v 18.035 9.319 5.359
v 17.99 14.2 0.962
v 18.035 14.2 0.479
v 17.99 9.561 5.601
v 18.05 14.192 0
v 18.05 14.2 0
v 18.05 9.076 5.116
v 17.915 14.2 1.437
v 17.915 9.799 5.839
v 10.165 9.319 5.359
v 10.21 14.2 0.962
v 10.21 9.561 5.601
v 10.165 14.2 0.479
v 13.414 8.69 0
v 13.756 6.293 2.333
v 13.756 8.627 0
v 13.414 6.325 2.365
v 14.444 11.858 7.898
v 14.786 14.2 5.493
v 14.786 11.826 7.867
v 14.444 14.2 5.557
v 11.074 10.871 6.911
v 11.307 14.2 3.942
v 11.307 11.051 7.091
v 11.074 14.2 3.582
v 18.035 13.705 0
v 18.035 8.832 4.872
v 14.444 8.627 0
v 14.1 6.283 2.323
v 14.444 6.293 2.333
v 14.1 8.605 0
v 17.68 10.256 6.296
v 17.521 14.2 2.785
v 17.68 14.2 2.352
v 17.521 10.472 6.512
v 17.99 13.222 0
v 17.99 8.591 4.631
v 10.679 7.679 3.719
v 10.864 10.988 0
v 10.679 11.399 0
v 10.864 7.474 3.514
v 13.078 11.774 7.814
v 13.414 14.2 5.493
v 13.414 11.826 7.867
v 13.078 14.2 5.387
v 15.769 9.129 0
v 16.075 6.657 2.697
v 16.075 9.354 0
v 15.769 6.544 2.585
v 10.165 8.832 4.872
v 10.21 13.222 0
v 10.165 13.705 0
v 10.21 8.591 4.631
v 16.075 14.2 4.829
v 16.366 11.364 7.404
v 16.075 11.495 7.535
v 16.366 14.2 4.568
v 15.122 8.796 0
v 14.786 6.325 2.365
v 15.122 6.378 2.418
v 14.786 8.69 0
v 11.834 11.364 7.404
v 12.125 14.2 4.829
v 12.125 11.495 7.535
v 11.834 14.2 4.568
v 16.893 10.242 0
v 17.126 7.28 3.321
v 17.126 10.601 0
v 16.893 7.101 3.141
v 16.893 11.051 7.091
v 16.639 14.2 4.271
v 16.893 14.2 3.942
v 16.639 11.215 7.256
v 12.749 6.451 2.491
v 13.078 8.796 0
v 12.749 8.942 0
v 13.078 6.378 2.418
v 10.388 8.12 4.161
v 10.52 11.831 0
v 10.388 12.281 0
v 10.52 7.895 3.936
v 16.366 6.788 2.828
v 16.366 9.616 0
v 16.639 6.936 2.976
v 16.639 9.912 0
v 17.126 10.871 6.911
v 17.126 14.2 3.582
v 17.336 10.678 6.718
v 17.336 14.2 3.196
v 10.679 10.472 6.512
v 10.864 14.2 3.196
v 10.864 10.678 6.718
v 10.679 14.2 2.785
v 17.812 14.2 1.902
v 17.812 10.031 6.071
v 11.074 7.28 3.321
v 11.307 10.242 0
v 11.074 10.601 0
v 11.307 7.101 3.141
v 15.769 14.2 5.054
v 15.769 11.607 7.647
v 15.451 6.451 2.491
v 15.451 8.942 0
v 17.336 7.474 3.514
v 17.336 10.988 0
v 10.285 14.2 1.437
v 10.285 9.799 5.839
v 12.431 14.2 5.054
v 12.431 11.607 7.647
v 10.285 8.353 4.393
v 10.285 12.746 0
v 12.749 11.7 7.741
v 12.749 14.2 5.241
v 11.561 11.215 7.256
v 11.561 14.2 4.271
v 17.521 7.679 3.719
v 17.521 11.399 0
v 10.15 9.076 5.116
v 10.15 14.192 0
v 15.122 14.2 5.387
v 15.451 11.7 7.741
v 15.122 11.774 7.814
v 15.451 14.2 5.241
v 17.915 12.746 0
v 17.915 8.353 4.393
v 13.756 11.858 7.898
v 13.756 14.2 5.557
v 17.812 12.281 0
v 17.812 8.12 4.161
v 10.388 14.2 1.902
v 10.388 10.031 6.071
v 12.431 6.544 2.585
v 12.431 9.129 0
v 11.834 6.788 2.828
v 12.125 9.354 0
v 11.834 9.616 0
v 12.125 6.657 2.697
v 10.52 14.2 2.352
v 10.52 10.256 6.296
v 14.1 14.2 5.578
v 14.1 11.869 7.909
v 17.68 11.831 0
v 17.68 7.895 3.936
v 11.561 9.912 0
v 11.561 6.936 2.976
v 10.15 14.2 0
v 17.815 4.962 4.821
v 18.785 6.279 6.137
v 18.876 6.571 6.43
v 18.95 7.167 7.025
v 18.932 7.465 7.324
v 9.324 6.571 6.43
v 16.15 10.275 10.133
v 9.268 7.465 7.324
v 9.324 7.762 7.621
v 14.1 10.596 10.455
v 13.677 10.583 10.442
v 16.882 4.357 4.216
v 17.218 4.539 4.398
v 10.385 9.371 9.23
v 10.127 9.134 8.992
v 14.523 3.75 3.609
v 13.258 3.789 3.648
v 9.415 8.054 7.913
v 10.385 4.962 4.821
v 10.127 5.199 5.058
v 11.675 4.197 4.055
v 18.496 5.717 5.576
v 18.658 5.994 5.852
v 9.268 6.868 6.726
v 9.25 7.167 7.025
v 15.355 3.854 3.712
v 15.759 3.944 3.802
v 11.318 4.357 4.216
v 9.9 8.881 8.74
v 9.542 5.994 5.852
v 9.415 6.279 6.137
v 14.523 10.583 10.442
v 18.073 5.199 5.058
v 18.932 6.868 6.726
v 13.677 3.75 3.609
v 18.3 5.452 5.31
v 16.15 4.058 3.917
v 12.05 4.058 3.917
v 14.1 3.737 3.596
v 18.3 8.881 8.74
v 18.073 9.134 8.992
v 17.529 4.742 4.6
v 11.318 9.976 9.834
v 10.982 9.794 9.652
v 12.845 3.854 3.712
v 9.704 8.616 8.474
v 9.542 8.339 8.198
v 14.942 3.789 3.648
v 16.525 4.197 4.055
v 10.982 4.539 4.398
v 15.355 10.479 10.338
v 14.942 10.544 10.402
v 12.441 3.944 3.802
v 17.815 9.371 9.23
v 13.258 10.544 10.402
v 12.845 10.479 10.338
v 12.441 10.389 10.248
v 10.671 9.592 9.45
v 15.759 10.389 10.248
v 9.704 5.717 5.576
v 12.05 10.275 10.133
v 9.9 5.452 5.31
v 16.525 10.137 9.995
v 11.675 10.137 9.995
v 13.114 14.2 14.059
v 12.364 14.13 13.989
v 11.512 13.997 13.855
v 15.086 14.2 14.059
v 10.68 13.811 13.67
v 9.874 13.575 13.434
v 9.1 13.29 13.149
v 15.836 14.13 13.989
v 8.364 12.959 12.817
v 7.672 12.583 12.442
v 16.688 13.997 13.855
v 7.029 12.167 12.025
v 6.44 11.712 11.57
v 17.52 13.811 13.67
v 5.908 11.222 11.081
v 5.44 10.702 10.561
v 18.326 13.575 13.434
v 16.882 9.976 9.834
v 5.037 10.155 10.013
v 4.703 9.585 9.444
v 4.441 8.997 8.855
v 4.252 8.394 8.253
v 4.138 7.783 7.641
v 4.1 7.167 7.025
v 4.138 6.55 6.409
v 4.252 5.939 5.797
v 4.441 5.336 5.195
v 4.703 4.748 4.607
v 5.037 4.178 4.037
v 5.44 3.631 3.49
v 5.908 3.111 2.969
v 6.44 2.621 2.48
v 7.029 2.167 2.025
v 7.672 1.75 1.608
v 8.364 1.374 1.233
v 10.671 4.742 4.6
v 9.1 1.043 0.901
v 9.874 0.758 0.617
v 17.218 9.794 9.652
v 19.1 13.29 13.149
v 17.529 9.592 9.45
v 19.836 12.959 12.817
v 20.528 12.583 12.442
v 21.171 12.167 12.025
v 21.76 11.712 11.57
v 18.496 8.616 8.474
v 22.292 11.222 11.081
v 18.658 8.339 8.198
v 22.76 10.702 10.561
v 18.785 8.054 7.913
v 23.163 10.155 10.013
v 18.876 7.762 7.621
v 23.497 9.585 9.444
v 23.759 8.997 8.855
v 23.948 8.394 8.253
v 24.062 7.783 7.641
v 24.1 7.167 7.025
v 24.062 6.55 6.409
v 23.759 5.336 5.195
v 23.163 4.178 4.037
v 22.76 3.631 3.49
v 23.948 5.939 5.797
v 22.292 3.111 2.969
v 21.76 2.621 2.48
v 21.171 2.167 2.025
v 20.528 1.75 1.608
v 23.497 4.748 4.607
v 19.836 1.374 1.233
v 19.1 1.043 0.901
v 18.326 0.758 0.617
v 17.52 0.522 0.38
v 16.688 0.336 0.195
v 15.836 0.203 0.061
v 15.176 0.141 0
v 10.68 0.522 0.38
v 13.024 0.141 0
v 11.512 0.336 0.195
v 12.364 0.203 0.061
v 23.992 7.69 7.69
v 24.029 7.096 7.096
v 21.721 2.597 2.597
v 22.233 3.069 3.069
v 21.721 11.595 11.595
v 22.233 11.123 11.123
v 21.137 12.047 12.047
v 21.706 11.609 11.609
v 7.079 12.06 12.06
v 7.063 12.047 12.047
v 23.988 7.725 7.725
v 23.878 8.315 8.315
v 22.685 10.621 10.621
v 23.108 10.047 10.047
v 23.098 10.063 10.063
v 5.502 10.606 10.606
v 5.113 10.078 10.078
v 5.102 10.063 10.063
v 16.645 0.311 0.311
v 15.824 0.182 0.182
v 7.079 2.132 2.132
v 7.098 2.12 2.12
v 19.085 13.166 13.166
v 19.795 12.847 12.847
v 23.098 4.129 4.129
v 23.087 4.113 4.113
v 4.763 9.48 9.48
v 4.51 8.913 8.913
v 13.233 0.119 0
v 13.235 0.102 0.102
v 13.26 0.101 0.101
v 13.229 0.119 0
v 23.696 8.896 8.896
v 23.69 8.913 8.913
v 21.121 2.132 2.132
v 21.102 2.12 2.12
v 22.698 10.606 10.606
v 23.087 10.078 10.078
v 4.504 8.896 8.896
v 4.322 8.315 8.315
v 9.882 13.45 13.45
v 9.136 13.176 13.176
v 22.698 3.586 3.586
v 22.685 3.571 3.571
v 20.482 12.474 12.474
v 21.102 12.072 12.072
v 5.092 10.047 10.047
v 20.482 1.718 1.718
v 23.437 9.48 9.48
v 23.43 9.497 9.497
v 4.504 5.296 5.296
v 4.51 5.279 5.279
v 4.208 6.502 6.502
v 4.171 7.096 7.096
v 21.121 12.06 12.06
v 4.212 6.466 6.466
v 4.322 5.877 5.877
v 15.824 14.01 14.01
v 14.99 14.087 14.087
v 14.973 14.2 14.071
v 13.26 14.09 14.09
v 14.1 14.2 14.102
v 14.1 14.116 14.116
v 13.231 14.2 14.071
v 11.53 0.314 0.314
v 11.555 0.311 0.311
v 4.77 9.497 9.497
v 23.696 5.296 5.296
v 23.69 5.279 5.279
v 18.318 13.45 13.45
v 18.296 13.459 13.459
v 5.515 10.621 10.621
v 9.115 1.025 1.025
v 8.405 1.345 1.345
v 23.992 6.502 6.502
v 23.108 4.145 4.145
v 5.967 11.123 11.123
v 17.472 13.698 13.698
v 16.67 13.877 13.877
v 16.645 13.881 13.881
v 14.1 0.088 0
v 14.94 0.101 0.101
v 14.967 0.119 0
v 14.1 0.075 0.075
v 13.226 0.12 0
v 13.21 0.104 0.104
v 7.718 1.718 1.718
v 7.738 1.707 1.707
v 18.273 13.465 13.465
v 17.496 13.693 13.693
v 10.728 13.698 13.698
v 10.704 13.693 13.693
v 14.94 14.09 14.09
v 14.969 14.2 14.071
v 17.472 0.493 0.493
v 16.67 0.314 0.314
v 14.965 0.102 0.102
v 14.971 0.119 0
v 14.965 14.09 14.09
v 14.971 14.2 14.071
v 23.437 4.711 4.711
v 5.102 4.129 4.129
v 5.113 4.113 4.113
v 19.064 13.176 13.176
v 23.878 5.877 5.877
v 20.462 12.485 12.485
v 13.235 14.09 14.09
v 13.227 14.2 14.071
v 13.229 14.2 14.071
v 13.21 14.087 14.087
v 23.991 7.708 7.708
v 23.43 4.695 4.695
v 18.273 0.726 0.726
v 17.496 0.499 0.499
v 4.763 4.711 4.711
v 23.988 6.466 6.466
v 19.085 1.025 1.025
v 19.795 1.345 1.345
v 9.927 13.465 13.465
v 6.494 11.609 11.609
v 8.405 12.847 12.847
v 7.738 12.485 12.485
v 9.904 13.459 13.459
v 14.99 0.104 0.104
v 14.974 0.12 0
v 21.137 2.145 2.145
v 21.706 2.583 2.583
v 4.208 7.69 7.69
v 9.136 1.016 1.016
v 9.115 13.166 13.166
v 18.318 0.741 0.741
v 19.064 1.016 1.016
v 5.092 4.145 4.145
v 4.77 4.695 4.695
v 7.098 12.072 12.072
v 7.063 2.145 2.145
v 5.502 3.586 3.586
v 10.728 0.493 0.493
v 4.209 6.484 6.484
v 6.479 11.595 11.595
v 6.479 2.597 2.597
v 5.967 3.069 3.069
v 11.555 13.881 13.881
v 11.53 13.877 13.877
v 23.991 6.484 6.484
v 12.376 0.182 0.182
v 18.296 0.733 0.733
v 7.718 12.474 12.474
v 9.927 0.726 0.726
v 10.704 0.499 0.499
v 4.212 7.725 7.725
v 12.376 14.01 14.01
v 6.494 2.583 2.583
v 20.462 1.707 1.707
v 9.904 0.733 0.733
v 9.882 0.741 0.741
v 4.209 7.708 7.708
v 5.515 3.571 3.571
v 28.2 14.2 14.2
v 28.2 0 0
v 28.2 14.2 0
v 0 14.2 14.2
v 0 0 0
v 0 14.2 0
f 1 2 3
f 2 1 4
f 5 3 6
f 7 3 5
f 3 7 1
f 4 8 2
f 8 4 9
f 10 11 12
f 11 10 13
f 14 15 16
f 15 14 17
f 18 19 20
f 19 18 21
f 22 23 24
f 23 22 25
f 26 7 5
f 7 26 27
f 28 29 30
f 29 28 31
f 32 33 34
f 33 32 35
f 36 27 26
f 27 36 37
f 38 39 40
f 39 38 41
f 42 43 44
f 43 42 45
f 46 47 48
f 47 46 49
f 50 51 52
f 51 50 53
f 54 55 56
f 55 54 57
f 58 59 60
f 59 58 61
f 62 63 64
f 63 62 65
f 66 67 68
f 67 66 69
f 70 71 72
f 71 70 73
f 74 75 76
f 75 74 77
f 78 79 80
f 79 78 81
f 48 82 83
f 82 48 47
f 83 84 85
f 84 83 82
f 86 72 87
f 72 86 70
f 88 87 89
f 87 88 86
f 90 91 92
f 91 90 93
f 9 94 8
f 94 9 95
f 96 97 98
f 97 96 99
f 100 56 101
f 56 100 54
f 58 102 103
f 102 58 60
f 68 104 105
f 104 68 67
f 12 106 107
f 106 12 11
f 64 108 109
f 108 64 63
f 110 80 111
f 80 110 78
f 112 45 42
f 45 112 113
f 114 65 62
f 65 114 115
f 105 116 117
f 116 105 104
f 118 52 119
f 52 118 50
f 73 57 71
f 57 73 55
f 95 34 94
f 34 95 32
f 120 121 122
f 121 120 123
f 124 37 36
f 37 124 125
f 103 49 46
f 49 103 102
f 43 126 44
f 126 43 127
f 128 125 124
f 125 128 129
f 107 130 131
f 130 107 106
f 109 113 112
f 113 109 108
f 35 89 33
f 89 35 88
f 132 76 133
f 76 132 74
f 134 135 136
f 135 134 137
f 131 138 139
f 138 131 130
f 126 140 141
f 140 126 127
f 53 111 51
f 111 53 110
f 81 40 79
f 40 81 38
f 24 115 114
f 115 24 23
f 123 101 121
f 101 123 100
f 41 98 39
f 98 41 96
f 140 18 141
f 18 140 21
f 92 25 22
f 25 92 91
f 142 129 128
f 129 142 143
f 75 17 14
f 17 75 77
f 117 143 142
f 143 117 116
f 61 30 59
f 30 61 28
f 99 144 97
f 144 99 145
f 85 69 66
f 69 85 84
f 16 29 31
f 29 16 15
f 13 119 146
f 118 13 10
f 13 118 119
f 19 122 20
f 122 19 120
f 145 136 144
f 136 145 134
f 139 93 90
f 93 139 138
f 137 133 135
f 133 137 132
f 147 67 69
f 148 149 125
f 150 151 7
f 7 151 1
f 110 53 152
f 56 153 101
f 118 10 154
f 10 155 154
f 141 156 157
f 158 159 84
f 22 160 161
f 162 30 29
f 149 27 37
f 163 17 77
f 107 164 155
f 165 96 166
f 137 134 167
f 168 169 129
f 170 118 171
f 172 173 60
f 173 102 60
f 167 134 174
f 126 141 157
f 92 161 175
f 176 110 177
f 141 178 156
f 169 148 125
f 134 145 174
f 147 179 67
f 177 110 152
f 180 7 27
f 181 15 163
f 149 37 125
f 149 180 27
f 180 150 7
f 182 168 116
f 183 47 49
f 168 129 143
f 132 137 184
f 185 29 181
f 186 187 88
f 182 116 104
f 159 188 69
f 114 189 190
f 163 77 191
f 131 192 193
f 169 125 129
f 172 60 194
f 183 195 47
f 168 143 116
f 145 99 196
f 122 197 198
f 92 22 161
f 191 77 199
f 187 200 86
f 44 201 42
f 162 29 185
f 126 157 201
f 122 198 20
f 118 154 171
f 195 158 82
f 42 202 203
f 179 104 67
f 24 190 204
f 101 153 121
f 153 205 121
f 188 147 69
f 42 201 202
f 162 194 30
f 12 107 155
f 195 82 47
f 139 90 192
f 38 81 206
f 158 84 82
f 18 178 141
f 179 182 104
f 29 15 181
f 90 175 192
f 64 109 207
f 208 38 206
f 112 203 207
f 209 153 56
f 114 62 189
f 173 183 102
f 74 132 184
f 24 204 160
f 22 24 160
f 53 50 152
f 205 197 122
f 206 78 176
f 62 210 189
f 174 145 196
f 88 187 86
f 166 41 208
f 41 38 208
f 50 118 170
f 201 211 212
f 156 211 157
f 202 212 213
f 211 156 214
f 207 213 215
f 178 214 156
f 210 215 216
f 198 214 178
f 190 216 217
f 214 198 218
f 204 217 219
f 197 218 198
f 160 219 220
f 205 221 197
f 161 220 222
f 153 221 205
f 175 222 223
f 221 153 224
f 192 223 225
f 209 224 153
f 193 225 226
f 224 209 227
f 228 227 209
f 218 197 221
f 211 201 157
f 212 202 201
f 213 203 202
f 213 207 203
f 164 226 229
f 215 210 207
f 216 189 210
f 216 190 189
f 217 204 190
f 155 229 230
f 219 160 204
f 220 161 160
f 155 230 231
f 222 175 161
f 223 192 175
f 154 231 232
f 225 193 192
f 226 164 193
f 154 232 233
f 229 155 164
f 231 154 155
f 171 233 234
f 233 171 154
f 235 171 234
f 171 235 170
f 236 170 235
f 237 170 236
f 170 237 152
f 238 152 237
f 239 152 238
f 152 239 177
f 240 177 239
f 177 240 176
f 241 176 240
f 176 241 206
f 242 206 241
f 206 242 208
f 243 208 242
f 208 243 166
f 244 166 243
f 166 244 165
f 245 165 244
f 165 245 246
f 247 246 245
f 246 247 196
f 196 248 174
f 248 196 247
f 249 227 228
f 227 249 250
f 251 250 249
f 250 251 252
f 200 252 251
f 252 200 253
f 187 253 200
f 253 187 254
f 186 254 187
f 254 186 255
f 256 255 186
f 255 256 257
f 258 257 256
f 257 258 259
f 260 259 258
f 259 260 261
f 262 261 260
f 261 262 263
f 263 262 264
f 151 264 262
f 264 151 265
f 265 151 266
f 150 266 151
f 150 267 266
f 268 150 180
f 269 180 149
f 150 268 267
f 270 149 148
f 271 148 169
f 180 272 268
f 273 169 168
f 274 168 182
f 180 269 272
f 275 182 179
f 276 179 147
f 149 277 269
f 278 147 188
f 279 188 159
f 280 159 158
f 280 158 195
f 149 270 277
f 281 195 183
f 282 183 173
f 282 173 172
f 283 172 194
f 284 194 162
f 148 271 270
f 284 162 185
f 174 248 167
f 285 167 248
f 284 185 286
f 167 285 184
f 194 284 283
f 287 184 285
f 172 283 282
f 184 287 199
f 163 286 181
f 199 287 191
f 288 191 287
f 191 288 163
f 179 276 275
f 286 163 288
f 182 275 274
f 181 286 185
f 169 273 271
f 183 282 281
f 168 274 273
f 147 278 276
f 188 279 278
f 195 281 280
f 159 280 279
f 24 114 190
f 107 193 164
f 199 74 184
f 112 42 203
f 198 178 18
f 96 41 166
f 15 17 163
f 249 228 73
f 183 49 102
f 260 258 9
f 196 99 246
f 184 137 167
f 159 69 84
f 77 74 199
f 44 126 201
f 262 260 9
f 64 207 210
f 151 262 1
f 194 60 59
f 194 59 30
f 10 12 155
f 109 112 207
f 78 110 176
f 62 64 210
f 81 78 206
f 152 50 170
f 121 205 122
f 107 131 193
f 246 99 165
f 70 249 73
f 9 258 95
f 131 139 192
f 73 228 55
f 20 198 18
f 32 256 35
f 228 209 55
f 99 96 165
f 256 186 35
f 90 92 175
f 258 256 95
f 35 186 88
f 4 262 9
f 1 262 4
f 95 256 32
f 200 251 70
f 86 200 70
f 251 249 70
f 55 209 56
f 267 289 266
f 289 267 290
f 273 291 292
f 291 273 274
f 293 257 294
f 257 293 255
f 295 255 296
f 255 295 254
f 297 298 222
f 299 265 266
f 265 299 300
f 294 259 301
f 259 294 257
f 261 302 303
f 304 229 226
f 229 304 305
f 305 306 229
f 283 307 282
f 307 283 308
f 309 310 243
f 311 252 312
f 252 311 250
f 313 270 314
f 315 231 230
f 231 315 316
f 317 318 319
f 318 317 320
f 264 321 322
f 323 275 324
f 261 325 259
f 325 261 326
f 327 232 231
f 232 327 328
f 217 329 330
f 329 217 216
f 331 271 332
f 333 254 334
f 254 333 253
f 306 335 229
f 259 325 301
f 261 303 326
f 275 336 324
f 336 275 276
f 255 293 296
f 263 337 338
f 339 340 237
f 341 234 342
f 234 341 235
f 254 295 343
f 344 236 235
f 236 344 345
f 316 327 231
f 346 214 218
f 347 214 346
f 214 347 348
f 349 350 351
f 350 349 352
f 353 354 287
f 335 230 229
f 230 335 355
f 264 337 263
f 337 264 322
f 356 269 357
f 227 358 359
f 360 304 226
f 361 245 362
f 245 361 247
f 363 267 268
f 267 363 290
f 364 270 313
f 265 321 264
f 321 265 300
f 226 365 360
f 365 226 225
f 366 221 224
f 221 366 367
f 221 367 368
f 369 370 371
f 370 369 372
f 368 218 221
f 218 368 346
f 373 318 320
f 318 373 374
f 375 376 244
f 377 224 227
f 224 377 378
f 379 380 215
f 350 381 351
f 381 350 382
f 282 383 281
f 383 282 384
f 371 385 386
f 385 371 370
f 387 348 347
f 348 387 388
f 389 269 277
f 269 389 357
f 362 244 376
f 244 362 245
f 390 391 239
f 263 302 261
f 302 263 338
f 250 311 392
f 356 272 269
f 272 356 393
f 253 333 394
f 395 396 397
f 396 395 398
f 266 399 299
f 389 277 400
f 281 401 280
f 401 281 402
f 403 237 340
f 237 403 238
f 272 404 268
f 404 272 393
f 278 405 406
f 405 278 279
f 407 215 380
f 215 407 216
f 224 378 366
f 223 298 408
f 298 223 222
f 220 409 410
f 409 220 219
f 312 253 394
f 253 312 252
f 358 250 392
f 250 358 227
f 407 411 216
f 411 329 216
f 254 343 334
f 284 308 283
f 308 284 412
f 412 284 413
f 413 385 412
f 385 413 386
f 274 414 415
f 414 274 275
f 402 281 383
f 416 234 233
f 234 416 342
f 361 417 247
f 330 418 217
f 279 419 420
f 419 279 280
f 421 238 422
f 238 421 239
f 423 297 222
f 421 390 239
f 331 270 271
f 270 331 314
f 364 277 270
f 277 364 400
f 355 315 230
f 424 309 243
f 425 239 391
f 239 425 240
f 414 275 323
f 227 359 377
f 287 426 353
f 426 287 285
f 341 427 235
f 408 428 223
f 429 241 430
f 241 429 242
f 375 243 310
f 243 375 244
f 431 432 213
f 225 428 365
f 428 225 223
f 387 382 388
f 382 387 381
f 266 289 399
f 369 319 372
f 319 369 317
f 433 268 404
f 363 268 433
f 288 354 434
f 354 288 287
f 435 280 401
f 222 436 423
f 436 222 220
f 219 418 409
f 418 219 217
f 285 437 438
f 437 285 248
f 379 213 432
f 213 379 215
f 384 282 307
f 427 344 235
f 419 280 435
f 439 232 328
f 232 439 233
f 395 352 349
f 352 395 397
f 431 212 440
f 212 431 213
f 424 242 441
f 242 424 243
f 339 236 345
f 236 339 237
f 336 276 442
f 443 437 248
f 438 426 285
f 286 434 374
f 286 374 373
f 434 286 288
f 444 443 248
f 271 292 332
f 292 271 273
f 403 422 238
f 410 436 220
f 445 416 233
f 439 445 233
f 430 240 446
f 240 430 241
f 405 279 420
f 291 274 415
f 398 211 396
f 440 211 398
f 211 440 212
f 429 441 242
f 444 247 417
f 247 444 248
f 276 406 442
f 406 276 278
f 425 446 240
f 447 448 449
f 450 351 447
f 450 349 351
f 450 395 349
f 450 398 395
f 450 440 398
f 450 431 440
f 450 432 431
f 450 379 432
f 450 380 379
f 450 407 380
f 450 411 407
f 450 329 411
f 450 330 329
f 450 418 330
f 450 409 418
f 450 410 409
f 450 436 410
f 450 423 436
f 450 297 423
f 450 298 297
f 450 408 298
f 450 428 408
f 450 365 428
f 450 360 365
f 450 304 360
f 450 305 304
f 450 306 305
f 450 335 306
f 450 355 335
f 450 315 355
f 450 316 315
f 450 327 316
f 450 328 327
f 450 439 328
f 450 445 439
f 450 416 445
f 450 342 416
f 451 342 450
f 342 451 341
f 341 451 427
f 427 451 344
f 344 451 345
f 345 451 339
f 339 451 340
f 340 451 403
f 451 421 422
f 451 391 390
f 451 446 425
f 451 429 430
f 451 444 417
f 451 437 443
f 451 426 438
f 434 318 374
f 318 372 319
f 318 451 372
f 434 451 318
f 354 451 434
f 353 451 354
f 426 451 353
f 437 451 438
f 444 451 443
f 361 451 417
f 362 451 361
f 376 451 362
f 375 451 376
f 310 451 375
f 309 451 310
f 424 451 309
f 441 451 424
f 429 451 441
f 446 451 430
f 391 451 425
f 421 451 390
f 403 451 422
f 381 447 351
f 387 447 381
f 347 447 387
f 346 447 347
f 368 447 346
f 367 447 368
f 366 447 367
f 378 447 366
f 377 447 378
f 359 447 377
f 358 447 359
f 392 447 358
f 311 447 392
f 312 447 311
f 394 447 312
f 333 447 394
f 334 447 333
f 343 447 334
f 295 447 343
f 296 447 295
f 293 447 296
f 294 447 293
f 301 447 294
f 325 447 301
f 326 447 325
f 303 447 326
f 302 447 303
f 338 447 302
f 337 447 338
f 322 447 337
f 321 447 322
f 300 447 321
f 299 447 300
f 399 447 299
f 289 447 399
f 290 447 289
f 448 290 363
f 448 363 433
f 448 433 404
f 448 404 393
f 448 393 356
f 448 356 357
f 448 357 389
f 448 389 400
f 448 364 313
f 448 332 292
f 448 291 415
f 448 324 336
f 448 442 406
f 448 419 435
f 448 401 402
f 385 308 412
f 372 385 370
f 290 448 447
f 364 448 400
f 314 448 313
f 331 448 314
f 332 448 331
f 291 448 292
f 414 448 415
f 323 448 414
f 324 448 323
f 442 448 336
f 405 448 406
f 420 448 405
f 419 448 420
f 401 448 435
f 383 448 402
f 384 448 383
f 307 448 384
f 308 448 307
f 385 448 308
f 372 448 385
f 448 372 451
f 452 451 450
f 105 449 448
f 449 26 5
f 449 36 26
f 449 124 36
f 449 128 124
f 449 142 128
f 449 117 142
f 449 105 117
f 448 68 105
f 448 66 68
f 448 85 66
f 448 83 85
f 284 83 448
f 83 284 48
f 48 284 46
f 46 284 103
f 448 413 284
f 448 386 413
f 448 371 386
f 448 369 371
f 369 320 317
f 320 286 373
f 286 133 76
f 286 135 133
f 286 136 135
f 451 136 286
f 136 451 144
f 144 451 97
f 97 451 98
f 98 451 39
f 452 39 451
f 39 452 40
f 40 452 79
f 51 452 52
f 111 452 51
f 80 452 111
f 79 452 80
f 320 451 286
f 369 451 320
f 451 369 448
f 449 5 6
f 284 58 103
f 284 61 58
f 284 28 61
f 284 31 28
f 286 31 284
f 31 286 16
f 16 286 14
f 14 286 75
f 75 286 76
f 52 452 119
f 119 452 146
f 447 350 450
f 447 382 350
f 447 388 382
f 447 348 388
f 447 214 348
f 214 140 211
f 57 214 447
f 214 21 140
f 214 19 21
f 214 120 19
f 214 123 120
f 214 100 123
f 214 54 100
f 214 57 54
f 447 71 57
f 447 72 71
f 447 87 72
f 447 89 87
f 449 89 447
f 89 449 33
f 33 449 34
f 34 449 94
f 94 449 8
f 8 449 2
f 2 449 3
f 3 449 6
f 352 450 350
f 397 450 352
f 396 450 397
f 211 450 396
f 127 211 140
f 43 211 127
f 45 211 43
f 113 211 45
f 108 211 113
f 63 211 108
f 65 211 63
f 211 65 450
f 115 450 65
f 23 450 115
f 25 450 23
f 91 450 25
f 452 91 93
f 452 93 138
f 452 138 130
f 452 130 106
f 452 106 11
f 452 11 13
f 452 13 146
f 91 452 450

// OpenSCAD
//SolarSchraubenAdapter2

$fn=72;

y=34.5;
y2=14.2;
to=0.2;
h1=y2;//14.8+to;
y1=y-y2+to;
w=28.2;

hs=52;
hs3=2.8;
hs2=5.5-hs3;
hs1=hs-hs2-hs3;

d1=7.5+to+to;
d2=9.7;
d3=20;
d4=16;

module klotz()
{
translate([w,0,0])
rotate([0,270,0])
linear_extrude(w)
polygon([[0,0],[h1,y2],[0,y2]]);
}

module schraube()
{
    cylinder(h=hs1,d=d1);
    
    translate([0,0,hs1])
    cylinder(h=hs2, d1=d1, d2=d2);
    
    translate([0,0,hs1+hs2])
    cylinder(h=hs3, d1=d3, d2=d4);
}

module sch2()
{
    rotate([45,0,0])
    translate([w/2,10.035,-49.3])
    color("green")
    schraube();
}

difference()
{
    klotz();
    sch2();
}
